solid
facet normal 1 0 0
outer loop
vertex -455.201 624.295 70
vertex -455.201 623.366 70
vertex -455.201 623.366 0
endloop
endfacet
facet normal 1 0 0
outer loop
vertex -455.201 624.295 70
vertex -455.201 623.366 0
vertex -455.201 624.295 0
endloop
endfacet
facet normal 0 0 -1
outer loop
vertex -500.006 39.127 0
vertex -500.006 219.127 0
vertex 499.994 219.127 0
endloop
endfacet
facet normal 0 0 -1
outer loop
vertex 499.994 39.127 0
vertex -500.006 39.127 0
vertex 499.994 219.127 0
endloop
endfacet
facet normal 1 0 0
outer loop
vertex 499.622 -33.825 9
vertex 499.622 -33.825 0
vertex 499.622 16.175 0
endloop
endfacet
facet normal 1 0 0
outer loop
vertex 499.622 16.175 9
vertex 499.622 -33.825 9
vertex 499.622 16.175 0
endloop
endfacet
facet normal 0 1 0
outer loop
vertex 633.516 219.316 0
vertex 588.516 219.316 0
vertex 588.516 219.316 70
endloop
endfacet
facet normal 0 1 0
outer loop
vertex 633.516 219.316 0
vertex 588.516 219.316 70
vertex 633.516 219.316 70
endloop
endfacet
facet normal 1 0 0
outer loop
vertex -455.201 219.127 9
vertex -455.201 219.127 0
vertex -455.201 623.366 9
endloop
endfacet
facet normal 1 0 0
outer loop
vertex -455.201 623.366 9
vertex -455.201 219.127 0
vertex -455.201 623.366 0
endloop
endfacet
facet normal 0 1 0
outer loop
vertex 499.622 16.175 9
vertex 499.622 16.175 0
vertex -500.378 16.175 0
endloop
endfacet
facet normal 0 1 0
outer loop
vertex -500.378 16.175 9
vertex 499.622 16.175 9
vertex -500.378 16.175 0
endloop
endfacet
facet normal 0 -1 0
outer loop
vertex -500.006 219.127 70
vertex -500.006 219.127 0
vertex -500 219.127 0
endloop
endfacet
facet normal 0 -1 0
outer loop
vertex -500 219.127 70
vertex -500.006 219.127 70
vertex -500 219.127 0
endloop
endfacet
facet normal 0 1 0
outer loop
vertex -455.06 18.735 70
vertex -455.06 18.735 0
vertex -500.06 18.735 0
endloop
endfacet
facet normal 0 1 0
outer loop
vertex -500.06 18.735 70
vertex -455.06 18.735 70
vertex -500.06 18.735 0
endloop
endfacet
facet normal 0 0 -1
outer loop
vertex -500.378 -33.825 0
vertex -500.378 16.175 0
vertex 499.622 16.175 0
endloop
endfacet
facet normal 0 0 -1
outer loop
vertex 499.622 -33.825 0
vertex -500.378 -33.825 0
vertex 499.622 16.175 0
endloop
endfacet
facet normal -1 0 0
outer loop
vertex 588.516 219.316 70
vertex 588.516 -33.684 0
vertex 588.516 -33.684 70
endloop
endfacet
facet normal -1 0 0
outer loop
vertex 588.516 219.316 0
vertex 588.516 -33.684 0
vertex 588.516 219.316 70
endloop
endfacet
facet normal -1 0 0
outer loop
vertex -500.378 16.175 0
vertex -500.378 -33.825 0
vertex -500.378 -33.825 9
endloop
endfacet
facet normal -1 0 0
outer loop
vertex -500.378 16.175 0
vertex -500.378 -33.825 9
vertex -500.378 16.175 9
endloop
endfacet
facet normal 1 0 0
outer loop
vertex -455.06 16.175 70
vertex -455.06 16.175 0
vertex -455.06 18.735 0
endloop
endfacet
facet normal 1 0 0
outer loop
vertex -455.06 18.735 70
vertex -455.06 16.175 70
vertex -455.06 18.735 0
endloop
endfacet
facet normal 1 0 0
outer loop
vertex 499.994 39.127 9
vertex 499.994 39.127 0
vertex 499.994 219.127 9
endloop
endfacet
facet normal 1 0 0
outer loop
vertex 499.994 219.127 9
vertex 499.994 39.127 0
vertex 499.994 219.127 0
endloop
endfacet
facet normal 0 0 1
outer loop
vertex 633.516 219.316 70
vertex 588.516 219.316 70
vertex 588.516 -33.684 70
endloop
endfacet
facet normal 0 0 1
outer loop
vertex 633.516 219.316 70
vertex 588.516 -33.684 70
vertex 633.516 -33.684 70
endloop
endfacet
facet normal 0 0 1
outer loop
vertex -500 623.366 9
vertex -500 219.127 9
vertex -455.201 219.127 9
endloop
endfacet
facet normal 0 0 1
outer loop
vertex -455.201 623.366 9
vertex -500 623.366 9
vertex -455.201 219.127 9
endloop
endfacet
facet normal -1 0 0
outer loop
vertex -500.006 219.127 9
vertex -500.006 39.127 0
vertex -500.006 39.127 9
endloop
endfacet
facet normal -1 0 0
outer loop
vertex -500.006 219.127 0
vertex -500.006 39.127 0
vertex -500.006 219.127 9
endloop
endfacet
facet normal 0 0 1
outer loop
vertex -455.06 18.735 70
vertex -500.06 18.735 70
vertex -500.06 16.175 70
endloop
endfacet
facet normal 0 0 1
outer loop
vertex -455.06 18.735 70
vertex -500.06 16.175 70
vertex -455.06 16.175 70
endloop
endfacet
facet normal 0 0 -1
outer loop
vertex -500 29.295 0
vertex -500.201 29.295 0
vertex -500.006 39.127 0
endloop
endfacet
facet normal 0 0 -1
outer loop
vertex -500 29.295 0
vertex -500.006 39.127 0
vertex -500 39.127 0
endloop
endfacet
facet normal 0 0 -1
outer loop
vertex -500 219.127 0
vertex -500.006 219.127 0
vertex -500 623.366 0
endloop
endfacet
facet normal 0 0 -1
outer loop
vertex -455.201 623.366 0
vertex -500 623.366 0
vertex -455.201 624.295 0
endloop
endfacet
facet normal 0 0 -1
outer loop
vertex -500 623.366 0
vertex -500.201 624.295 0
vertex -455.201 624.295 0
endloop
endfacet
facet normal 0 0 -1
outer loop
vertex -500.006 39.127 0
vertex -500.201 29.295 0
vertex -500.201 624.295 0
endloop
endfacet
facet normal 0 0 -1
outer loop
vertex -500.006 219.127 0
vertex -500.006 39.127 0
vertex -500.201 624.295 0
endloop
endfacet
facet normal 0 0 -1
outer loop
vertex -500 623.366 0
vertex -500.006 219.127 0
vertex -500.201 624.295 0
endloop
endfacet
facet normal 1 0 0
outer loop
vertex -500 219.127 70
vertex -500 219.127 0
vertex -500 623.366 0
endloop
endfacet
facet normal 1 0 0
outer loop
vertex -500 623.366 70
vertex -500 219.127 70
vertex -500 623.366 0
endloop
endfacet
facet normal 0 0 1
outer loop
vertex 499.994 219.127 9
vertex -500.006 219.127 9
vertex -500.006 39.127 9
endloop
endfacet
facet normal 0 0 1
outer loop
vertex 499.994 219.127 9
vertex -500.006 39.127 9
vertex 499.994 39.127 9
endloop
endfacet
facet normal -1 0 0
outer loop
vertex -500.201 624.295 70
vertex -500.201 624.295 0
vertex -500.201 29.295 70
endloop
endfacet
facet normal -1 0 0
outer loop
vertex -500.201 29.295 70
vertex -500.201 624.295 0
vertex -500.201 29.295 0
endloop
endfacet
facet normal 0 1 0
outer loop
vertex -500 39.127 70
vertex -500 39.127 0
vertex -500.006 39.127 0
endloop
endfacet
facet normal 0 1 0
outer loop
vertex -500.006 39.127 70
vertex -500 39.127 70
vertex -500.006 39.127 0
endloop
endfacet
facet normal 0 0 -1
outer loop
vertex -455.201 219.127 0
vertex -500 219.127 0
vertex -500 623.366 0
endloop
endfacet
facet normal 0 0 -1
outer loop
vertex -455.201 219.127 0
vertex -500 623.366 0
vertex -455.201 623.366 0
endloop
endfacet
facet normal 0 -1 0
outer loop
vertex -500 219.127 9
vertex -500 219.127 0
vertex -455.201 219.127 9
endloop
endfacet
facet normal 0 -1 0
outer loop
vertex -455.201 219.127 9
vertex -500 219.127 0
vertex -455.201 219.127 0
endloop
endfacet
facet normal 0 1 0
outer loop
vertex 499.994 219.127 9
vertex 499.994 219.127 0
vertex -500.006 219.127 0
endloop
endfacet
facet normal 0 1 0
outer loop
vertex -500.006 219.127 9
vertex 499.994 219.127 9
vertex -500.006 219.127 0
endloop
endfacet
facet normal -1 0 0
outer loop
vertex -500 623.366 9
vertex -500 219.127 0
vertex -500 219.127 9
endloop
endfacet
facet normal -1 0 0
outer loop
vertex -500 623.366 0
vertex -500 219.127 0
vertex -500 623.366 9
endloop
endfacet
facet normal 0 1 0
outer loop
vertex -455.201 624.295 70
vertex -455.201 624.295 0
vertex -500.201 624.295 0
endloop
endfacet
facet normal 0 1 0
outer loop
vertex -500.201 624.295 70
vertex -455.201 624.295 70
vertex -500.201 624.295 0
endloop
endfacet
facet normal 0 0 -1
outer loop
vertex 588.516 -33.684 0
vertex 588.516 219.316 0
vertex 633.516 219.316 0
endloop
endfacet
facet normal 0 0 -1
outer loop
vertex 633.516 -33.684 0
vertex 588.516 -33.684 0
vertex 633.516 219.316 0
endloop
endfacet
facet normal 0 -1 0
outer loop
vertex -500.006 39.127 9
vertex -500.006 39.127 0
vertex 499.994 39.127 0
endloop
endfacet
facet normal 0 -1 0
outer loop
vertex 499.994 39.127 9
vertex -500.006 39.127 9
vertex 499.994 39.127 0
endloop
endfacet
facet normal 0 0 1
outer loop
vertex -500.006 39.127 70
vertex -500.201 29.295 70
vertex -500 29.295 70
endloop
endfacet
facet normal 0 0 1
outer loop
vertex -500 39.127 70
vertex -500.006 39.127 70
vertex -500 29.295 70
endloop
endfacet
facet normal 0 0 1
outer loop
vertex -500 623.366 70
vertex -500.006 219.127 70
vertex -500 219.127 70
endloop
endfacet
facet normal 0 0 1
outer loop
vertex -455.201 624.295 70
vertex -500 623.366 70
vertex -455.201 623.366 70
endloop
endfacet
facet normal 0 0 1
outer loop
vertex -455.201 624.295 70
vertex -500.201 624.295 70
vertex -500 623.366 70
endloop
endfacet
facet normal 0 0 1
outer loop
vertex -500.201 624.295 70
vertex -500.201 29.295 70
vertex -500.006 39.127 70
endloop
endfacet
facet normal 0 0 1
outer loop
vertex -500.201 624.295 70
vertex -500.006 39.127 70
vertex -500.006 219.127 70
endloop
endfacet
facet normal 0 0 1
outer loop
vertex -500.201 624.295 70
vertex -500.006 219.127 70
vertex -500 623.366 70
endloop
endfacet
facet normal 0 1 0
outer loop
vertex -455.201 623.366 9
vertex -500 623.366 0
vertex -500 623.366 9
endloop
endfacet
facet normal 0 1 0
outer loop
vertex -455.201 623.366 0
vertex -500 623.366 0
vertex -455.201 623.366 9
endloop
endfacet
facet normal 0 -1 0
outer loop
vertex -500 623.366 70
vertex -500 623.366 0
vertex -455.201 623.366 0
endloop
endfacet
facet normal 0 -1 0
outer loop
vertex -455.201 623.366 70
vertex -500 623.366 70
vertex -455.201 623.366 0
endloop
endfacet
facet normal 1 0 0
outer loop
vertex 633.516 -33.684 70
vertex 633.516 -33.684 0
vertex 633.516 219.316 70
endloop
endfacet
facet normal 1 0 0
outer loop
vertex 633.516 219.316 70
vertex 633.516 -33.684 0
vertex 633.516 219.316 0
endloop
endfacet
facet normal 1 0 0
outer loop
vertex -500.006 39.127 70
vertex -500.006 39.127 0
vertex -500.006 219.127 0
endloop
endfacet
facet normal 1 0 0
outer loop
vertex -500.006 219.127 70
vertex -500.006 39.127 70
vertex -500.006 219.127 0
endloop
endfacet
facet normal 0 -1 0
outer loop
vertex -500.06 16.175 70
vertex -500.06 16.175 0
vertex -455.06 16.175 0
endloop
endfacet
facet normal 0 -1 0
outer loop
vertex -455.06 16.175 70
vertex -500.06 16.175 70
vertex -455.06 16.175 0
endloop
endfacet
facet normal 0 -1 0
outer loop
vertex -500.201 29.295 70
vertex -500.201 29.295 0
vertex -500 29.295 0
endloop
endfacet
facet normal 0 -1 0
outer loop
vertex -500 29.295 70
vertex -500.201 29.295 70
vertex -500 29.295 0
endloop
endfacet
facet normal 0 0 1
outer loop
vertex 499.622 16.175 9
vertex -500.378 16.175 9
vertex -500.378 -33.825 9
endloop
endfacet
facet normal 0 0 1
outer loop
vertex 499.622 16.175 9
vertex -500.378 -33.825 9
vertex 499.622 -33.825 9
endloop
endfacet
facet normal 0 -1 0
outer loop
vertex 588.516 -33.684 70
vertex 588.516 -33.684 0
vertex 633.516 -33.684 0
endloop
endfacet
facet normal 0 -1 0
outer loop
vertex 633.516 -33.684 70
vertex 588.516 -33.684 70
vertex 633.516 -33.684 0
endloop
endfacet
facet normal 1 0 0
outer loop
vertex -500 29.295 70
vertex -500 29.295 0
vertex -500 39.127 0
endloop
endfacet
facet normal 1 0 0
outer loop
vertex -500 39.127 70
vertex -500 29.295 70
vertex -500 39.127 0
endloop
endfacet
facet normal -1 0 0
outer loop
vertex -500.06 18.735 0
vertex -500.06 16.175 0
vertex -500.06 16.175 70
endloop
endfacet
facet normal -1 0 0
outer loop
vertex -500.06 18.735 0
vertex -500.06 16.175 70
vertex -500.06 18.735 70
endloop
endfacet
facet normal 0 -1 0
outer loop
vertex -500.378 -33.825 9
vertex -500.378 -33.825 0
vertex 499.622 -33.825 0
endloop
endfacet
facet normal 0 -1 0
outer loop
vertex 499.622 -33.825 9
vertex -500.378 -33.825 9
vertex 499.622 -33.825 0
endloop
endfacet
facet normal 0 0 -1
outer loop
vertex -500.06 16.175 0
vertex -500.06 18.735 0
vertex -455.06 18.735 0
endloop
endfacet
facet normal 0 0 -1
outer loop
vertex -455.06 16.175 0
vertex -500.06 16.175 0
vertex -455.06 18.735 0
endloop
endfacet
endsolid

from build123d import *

# Parameters (mm, degrees)
F0_W     = 44.7985618902
F0_H     = 404.2391658774
F1_DEPTH = 9
F0_W_2   = 0.0055646896
F0_H_2   = 180
F0_W_3   = 955.1958734202
F2_DEPTH = 9
F0_W_4   = 0.3171729233
F0_H_3   = 50
F0_W_5   = 0.0603545521
F0_W_6   = 44.9396454479
F0_W_7   = 954.6828270767
F3_DEPTH = 9
F0_H_4   = 2.5599607918
F4_DEPTH = 70
F5_DEPTH = 70
F0_W_8   = 45
F0_H_5   = 253
F6_DEPTH = 70


with BuildPart() as f1:
    # F0 (on Top) → F1 (new body)
    with BuildSketch(Plane.XY):
        with Locations((-477.6007190549, 421.2462169404)):
            Rectangle(F0_W, F0_H)
    extrude(amount=F1_DEPTH)


with BuildPart() as f2:
    # F0 (on Top) → F2 (new body)
    with BuildSketch(Plane.XY):
        with Locations((-500.0027823448, 129.1266340017)):
            Rectangle(F0_W_2, F0_H_2)
        with Locations((-477.6007190549, 129.1266340017)):
            Rectangle(F0_W, F0_H_2)
        with Locations((22.3964986003, 129.1266340017)):
            Rectangle(F0_W_3, F0_H_2)
    extrude(amount=F2_DEPTH)


with BuildPart() as f3:
    # F0 (on Top) → F3 (new body)
    with BuildSketch(Plane.XY):
        with Locations((-500.2189410137, -8.8252942637)):
            Rectangle(F0_W_4, F0_H_3)
        with Locations((-500.0301772761, -8.8252942637)):
            Rectangle(F0_W_5, F0_H_3)
        with Locations((-477.5301772761, -8.8252942637)):
            Rectangle(F0_W_6, F0_H_3)
        with Locations((22.2810589863, -8.8252942637)):
            Rectangle(F0_W_7, F0_H_3)
    extrude(amount=F3_DEPTH)


with BuildPart() as f4:
    # F0 (on Top) → F4 (new body)
    with BuildSketch(Plane.XY):
        with Locations((-500.0301772761, 17.4546861322)):
            Rectangle(F0_W_5, F0_H_4)
        with Locations((-477.5301772761, 17.4546861322)):
            Rectangle(F0_W_6, F0_H_4)
    extrude(amount=F4_DEPTH)


with BuildPart() as f5:
    # F0 (on Top) → F5 (new body)
    with BuildSketch(Plane.XY):
        Polygon((-500, 219.1266340017), (-500, 623.3657998791), (-455.2014381098, 623.3657998791), (-455.2014381098, 624.2948468162), (-500.2014381098, 624.2948468162), (-500.2014381098, 29.2948468162), (-500, 29.2948468162), (-500, 39.1266340017), (-500.0055646896, 39.1266340017), (-500.0055646896, 219.1266340017), align=None)
    extrude(amount=F5_DEPTH)


with BuildPart() as f6:
    # F0 (on Top) → F6 (new body)
    with BuildSketch(Plane.XY):
        with Locations((611.0157072544, 92.8157727197)):
            Rectangle(F0_W_8, F0_H_5)
    extrude(amount=F6_DEPTH)


solid = Compound([f1.part, f2.part, f3.part, f4.part, f5.part, f6.part])
